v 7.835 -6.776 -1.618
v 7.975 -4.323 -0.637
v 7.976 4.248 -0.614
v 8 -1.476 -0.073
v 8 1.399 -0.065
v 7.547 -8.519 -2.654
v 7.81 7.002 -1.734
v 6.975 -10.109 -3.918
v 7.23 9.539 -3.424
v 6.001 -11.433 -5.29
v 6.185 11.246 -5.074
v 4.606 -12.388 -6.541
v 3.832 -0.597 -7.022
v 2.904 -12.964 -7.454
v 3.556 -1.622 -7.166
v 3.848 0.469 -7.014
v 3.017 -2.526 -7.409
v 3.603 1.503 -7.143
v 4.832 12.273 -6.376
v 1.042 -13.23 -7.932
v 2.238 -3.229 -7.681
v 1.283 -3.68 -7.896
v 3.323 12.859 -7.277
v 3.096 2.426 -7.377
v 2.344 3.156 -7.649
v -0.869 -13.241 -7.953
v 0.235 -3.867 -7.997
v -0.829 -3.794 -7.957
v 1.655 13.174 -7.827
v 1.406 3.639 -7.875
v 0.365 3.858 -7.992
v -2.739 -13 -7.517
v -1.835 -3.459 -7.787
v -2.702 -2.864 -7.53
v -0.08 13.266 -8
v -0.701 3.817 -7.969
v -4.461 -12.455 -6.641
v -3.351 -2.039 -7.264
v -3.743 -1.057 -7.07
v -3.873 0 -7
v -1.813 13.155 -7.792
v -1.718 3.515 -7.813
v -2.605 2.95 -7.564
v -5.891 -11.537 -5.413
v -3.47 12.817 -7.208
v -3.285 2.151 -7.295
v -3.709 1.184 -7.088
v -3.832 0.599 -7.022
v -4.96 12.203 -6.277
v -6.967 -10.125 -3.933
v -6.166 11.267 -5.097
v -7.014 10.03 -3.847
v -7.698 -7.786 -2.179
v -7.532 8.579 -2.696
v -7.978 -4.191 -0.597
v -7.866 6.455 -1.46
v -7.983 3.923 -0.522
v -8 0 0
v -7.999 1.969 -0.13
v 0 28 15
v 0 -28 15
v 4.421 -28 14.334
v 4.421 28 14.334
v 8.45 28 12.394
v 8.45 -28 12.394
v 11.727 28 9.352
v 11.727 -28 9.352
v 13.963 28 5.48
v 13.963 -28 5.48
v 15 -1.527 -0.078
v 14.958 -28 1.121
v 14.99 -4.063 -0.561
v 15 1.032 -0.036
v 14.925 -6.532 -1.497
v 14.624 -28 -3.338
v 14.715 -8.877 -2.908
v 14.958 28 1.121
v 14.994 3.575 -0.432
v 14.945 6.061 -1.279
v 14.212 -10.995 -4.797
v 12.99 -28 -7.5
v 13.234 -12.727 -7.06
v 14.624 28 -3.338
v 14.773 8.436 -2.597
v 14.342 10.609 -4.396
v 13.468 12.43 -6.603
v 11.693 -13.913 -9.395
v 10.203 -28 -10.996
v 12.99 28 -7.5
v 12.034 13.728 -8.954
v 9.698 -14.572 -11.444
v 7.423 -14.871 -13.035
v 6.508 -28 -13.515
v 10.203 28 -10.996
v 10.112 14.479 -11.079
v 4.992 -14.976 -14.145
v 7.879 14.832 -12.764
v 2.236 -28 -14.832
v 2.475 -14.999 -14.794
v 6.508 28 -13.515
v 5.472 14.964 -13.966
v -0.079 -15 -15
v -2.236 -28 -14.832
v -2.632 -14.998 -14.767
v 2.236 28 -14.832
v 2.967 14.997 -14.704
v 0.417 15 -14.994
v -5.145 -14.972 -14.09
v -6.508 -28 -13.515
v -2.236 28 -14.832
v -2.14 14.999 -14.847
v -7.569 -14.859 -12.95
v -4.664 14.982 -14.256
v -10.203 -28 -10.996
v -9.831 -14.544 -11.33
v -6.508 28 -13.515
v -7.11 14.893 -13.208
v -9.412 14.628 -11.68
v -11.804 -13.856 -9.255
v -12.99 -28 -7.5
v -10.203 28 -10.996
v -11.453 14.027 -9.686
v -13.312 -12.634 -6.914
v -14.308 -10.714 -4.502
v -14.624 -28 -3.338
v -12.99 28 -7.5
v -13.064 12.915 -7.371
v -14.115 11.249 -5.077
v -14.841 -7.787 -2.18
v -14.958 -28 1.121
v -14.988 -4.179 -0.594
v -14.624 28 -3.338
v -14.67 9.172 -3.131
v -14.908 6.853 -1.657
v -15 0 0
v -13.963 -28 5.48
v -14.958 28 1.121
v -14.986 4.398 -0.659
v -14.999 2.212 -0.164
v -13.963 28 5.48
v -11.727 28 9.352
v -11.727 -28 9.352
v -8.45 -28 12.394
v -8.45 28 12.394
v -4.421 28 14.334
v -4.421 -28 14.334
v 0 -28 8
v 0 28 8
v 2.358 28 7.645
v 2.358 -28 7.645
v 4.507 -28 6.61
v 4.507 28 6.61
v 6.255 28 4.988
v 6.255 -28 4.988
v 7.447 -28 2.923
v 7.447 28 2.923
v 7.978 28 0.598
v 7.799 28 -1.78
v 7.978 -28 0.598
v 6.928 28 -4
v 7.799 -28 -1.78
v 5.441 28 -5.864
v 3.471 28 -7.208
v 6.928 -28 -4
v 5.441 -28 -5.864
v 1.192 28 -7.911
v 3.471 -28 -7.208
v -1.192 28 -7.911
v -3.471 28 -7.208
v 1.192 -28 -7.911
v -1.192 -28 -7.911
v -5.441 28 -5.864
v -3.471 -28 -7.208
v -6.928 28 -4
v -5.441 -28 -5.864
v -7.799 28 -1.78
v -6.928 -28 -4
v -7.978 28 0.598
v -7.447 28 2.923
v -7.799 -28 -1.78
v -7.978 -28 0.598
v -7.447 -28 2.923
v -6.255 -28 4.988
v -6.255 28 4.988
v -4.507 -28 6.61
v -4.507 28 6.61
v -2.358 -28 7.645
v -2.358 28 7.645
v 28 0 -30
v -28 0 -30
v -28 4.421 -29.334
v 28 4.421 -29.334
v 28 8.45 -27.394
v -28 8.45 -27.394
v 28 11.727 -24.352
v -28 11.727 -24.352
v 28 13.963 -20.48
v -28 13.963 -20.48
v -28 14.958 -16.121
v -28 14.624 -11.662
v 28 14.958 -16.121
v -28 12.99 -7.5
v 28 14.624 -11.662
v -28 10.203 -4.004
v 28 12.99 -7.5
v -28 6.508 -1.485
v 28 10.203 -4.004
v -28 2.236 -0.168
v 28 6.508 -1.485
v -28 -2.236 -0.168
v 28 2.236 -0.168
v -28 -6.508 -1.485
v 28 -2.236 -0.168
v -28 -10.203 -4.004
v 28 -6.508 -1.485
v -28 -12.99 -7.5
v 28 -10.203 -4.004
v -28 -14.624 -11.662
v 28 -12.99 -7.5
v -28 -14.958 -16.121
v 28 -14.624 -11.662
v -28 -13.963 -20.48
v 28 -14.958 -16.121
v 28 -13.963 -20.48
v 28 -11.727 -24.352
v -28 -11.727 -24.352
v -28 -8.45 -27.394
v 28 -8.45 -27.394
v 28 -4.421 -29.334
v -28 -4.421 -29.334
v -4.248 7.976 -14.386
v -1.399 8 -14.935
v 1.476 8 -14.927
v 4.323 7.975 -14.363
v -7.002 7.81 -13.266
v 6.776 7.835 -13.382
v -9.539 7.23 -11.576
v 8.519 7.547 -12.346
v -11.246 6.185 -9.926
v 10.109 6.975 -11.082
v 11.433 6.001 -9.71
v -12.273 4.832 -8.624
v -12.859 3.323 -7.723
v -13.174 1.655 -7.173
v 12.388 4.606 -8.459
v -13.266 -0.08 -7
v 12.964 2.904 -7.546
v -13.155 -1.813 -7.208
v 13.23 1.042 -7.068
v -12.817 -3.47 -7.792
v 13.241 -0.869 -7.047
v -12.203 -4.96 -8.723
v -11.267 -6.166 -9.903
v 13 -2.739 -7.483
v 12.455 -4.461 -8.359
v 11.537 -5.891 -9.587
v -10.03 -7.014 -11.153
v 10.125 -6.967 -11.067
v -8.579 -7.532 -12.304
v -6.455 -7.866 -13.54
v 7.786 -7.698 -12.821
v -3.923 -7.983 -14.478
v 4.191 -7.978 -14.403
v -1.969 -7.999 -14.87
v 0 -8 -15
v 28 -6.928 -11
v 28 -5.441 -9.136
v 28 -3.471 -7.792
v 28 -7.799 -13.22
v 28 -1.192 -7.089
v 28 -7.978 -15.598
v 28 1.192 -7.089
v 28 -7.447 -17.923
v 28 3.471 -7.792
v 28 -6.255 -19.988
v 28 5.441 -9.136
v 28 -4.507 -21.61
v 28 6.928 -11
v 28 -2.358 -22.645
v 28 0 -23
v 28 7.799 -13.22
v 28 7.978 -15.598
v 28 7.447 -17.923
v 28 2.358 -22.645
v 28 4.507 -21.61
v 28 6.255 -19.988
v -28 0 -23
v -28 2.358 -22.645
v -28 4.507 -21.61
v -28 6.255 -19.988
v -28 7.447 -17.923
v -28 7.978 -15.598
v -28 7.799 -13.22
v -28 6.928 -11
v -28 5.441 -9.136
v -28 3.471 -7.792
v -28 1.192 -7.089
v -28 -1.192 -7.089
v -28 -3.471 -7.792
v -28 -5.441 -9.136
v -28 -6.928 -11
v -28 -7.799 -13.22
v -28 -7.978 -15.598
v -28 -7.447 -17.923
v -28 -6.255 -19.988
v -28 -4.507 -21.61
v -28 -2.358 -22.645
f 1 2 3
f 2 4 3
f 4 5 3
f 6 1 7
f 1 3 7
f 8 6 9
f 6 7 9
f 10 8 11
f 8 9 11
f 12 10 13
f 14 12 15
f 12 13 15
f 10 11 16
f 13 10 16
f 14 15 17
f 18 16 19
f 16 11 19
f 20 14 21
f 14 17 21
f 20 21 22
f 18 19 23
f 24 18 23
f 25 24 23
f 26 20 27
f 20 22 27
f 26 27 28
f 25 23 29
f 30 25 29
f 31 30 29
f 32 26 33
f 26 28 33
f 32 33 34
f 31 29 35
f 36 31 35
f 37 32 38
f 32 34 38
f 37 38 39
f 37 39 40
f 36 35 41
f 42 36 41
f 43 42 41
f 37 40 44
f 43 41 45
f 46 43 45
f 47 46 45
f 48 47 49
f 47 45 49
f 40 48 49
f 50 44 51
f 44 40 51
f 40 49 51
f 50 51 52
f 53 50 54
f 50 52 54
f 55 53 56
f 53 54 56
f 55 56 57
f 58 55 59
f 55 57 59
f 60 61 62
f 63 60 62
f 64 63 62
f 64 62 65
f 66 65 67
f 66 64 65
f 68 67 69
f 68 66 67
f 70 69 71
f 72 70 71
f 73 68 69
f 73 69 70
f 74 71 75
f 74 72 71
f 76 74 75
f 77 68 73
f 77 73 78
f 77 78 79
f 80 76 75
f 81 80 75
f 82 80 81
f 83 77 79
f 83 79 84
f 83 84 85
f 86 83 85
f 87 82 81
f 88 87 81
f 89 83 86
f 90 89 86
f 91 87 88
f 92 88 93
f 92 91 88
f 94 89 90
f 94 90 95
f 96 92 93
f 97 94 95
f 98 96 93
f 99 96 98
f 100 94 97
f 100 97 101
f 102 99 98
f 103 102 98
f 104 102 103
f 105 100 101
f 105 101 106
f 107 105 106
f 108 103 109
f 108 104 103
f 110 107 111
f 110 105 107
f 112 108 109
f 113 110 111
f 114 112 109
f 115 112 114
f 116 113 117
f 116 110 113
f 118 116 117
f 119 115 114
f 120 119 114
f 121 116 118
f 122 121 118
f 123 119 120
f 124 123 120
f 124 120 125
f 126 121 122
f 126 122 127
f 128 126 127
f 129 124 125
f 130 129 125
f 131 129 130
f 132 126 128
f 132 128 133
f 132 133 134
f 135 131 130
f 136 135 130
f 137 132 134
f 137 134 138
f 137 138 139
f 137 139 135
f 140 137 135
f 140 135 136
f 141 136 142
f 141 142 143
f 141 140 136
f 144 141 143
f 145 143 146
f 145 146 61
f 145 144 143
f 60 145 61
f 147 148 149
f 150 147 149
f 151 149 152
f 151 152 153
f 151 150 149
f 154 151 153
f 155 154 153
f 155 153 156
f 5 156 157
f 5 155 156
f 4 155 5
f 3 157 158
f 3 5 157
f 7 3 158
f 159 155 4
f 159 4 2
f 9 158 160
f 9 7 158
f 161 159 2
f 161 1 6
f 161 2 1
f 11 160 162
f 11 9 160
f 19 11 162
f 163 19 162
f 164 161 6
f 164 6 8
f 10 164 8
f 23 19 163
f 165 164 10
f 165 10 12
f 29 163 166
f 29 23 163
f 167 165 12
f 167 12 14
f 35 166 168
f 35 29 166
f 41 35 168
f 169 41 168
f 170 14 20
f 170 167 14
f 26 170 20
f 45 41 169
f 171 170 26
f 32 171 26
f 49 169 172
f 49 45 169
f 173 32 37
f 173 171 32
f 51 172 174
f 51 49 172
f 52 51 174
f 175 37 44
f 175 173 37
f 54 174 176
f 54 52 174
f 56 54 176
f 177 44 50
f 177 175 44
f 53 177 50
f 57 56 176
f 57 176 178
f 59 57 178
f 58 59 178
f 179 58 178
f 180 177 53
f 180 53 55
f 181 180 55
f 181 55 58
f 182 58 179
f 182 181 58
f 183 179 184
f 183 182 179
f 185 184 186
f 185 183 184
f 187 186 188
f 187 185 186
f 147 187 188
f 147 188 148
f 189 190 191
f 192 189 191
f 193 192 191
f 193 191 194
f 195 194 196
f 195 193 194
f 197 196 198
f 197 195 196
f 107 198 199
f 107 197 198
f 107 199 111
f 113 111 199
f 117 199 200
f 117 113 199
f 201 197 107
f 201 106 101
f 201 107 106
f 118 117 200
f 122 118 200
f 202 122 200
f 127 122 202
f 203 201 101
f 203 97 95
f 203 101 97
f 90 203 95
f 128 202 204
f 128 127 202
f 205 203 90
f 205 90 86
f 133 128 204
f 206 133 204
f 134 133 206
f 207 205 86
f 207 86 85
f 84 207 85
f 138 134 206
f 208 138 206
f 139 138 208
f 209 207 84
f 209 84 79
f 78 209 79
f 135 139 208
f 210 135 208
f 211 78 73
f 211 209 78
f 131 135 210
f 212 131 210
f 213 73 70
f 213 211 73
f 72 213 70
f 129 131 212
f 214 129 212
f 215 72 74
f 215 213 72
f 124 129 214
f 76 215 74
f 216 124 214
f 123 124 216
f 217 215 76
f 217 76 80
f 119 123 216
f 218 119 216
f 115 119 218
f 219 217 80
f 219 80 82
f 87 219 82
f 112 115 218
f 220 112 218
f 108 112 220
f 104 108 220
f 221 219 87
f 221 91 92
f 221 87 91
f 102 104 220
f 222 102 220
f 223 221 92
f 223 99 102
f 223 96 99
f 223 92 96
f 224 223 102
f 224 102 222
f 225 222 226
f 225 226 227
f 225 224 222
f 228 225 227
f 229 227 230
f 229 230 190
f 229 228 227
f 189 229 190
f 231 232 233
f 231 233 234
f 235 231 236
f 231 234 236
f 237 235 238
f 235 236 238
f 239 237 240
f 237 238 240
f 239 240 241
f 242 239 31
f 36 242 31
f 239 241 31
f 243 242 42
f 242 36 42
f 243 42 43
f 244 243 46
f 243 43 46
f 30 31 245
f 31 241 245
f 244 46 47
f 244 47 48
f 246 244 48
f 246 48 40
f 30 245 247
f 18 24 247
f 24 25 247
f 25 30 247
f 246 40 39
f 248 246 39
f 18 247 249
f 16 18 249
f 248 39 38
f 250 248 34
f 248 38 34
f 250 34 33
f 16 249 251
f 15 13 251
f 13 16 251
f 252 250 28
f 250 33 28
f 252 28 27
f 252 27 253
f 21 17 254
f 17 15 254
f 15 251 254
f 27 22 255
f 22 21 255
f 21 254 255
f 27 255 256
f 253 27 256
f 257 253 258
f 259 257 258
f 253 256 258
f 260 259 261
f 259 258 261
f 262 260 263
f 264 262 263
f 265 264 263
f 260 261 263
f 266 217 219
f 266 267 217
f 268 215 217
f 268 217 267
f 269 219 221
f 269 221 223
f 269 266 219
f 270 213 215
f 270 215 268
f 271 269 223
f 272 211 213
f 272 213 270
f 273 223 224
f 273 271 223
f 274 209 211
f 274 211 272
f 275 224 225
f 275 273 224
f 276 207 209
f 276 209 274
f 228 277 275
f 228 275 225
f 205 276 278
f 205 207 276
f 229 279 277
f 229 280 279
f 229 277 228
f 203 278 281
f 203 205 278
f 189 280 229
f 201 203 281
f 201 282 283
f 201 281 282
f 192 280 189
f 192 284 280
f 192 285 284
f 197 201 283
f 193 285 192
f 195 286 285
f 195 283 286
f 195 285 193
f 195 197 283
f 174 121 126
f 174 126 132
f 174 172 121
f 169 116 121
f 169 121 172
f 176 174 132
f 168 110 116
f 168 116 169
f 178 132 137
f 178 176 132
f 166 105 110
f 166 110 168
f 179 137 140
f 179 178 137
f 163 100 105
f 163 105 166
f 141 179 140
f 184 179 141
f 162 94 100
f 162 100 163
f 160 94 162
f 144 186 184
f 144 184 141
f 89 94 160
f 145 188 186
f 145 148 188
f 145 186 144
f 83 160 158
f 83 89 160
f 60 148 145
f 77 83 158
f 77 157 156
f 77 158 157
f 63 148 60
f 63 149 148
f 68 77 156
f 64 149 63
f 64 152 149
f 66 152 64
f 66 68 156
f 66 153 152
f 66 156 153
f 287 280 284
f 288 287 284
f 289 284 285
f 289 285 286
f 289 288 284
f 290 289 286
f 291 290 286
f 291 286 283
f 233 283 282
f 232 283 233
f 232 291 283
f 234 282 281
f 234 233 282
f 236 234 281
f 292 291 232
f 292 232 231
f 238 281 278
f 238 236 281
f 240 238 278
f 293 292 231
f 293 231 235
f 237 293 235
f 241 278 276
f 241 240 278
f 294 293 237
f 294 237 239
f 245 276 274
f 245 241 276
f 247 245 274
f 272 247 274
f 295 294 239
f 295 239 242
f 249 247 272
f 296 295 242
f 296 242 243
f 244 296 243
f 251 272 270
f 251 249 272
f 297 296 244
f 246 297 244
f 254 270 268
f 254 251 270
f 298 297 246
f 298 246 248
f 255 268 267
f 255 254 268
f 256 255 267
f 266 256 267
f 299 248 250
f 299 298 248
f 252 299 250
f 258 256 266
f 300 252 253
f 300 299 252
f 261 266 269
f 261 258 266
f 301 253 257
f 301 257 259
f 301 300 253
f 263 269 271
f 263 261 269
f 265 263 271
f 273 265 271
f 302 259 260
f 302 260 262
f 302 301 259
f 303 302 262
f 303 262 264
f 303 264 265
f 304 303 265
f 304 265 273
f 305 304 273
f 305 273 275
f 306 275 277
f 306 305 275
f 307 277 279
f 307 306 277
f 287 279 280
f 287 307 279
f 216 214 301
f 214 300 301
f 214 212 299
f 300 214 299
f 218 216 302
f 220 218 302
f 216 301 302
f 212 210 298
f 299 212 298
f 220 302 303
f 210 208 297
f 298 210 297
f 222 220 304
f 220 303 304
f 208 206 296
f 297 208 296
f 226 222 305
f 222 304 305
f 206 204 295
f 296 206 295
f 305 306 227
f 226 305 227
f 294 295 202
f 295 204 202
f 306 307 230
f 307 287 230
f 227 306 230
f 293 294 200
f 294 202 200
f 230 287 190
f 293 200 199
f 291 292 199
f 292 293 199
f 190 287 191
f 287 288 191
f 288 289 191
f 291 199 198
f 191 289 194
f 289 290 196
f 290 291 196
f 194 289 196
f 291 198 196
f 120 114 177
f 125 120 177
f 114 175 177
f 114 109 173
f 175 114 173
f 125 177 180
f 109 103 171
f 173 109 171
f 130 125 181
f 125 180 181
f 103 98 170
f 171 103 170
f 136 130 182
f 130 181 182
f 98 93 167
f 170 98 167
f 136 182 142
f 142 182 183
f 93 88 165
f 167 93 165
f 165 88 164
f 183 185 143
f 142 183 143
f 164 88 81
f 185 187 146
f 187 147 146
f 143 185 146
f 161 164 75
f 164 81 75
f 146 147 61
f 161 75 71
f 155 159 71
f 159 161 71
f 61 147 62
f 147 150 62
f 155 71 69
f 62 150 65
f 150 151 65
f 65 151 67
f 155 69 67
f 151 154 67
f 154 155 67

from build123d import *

# Parameters (mm, degrees)
SKETCH1_R           = 15
SKETCH1_R_2         = 8
BOSS_EXTRUDE1_DEPTH = 28
SKETCH2_R           = 15
SKETCH2_R_2         = 8
BOSS_EXTRUDE2_DEPTH = 28
SKETCH3_R           = 8
CUT_EXTRUDE1_DEPTH  = 70.426219995
SKETCH4_R           = 8
CUT_EXTRUDE2_DEPTH  = 70.426219995


with BuildPart() as part:
    # Sketch1 → Boss-Extrude1 (new, symmetric)
    with BuildSketch(Plane(origin=(0, 0, 0), x_dir=(1, 0, 0), z_dir=(0, 1, 0))):
        with Locations(Location((0, 0, 0), (0, 0, 270))):
            Circle(SKETCH1_R)
        with Locations(Location((0, 0, 0), (0, 0, 270))):
            Circle(SKETCH1_R_2, mode=Mode.SUBTRACT)
    extrude(amount=BOSS_EXTRUDE1_DEPTH, both=True)

    # Sketch2 → Boss-Extrude2 (add, symmetric)
    with BuildSketch(Plane(origin=(0, 0, 0), x_dir=(0, 0, -1), z_dir=(1, 0, 0))):
        with Locations((15, 0)):
            Circle(SKETCH2_R)
        with Locations((15, 0)):
            Circle(SKETCH2_R_2, mode=Mode.SUBTRACT)
    extrude(amount=BOSS_EXTRUDE2_DEPTH, both=True)

    # Sketch3 → Cut-Extrude1 (cut, through all)
    with BuildSketch(Plane(origin=(0, 28, 0), x_dir=(1, 0, 0), z_dir=(0, 1, 0))):
        with Locations(Location((0, 0, 0), (0, 0, 270))):
            Circle(SKETCH3_R)
    extrude(amount=-CUT_EXTRUDE1_DEPTH, mode=Mode.SUBTRACT)

    # Sketch4 → Cut-Extrude2 (cut, through all)
    with BuildSketch(Plane(origin=(28, 0, 0), x_dir=(0, 0, -1), z_dir=(1, 0, 0))):
        with Locations((15, 0)):
            Circle(SKETCH4_R)
    extrude(amount=-CUT_EXTRUDE2_DEPTH, mode=Mode.SUBTRACT)


solid = part.part
